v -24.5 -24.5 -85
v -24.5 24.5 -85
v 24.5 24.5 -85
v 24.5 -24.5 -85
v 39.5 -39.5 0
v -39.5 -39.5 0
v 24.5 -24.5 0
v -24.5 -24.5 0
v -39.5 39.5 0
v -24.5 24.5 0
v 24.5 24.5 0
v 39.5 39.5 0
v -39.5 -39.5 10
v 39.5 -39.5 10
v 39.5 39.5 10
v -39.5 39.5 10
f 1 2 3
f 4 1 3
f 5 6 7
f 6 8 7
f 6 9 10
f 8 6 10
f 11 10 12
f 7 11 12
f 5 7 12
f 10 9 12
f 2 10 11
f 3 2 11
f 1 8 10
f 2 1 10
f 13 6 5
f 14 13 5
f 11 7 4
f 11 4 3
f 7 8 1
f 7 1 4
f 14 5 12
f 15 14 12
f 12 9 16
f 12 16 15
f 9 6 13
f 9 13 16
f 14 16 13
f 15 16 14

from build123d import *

# Parameters (mm, degrees)
F0_W     = 79
F0_H     = 79
F1_DEPTH = 10
F2_W     = 49
F2_H     = 49
F3_DEPTH = 95


with BuildPart() as f1:
    # F0 (on Top) → F1 (new body)
    with BuildSketch(Plane.XY):
        Rectangle(F0_W, F0_H)
    extrude(amount=F1_DEPTH)

    # F2 (on face) → F3 (join)
    with BuildSketch(Plane.XY.offset(10)):
        Rectangle(F2_W, F2_H)
    extrude(amount=-F3_DEPTH)


solid = f1.part
